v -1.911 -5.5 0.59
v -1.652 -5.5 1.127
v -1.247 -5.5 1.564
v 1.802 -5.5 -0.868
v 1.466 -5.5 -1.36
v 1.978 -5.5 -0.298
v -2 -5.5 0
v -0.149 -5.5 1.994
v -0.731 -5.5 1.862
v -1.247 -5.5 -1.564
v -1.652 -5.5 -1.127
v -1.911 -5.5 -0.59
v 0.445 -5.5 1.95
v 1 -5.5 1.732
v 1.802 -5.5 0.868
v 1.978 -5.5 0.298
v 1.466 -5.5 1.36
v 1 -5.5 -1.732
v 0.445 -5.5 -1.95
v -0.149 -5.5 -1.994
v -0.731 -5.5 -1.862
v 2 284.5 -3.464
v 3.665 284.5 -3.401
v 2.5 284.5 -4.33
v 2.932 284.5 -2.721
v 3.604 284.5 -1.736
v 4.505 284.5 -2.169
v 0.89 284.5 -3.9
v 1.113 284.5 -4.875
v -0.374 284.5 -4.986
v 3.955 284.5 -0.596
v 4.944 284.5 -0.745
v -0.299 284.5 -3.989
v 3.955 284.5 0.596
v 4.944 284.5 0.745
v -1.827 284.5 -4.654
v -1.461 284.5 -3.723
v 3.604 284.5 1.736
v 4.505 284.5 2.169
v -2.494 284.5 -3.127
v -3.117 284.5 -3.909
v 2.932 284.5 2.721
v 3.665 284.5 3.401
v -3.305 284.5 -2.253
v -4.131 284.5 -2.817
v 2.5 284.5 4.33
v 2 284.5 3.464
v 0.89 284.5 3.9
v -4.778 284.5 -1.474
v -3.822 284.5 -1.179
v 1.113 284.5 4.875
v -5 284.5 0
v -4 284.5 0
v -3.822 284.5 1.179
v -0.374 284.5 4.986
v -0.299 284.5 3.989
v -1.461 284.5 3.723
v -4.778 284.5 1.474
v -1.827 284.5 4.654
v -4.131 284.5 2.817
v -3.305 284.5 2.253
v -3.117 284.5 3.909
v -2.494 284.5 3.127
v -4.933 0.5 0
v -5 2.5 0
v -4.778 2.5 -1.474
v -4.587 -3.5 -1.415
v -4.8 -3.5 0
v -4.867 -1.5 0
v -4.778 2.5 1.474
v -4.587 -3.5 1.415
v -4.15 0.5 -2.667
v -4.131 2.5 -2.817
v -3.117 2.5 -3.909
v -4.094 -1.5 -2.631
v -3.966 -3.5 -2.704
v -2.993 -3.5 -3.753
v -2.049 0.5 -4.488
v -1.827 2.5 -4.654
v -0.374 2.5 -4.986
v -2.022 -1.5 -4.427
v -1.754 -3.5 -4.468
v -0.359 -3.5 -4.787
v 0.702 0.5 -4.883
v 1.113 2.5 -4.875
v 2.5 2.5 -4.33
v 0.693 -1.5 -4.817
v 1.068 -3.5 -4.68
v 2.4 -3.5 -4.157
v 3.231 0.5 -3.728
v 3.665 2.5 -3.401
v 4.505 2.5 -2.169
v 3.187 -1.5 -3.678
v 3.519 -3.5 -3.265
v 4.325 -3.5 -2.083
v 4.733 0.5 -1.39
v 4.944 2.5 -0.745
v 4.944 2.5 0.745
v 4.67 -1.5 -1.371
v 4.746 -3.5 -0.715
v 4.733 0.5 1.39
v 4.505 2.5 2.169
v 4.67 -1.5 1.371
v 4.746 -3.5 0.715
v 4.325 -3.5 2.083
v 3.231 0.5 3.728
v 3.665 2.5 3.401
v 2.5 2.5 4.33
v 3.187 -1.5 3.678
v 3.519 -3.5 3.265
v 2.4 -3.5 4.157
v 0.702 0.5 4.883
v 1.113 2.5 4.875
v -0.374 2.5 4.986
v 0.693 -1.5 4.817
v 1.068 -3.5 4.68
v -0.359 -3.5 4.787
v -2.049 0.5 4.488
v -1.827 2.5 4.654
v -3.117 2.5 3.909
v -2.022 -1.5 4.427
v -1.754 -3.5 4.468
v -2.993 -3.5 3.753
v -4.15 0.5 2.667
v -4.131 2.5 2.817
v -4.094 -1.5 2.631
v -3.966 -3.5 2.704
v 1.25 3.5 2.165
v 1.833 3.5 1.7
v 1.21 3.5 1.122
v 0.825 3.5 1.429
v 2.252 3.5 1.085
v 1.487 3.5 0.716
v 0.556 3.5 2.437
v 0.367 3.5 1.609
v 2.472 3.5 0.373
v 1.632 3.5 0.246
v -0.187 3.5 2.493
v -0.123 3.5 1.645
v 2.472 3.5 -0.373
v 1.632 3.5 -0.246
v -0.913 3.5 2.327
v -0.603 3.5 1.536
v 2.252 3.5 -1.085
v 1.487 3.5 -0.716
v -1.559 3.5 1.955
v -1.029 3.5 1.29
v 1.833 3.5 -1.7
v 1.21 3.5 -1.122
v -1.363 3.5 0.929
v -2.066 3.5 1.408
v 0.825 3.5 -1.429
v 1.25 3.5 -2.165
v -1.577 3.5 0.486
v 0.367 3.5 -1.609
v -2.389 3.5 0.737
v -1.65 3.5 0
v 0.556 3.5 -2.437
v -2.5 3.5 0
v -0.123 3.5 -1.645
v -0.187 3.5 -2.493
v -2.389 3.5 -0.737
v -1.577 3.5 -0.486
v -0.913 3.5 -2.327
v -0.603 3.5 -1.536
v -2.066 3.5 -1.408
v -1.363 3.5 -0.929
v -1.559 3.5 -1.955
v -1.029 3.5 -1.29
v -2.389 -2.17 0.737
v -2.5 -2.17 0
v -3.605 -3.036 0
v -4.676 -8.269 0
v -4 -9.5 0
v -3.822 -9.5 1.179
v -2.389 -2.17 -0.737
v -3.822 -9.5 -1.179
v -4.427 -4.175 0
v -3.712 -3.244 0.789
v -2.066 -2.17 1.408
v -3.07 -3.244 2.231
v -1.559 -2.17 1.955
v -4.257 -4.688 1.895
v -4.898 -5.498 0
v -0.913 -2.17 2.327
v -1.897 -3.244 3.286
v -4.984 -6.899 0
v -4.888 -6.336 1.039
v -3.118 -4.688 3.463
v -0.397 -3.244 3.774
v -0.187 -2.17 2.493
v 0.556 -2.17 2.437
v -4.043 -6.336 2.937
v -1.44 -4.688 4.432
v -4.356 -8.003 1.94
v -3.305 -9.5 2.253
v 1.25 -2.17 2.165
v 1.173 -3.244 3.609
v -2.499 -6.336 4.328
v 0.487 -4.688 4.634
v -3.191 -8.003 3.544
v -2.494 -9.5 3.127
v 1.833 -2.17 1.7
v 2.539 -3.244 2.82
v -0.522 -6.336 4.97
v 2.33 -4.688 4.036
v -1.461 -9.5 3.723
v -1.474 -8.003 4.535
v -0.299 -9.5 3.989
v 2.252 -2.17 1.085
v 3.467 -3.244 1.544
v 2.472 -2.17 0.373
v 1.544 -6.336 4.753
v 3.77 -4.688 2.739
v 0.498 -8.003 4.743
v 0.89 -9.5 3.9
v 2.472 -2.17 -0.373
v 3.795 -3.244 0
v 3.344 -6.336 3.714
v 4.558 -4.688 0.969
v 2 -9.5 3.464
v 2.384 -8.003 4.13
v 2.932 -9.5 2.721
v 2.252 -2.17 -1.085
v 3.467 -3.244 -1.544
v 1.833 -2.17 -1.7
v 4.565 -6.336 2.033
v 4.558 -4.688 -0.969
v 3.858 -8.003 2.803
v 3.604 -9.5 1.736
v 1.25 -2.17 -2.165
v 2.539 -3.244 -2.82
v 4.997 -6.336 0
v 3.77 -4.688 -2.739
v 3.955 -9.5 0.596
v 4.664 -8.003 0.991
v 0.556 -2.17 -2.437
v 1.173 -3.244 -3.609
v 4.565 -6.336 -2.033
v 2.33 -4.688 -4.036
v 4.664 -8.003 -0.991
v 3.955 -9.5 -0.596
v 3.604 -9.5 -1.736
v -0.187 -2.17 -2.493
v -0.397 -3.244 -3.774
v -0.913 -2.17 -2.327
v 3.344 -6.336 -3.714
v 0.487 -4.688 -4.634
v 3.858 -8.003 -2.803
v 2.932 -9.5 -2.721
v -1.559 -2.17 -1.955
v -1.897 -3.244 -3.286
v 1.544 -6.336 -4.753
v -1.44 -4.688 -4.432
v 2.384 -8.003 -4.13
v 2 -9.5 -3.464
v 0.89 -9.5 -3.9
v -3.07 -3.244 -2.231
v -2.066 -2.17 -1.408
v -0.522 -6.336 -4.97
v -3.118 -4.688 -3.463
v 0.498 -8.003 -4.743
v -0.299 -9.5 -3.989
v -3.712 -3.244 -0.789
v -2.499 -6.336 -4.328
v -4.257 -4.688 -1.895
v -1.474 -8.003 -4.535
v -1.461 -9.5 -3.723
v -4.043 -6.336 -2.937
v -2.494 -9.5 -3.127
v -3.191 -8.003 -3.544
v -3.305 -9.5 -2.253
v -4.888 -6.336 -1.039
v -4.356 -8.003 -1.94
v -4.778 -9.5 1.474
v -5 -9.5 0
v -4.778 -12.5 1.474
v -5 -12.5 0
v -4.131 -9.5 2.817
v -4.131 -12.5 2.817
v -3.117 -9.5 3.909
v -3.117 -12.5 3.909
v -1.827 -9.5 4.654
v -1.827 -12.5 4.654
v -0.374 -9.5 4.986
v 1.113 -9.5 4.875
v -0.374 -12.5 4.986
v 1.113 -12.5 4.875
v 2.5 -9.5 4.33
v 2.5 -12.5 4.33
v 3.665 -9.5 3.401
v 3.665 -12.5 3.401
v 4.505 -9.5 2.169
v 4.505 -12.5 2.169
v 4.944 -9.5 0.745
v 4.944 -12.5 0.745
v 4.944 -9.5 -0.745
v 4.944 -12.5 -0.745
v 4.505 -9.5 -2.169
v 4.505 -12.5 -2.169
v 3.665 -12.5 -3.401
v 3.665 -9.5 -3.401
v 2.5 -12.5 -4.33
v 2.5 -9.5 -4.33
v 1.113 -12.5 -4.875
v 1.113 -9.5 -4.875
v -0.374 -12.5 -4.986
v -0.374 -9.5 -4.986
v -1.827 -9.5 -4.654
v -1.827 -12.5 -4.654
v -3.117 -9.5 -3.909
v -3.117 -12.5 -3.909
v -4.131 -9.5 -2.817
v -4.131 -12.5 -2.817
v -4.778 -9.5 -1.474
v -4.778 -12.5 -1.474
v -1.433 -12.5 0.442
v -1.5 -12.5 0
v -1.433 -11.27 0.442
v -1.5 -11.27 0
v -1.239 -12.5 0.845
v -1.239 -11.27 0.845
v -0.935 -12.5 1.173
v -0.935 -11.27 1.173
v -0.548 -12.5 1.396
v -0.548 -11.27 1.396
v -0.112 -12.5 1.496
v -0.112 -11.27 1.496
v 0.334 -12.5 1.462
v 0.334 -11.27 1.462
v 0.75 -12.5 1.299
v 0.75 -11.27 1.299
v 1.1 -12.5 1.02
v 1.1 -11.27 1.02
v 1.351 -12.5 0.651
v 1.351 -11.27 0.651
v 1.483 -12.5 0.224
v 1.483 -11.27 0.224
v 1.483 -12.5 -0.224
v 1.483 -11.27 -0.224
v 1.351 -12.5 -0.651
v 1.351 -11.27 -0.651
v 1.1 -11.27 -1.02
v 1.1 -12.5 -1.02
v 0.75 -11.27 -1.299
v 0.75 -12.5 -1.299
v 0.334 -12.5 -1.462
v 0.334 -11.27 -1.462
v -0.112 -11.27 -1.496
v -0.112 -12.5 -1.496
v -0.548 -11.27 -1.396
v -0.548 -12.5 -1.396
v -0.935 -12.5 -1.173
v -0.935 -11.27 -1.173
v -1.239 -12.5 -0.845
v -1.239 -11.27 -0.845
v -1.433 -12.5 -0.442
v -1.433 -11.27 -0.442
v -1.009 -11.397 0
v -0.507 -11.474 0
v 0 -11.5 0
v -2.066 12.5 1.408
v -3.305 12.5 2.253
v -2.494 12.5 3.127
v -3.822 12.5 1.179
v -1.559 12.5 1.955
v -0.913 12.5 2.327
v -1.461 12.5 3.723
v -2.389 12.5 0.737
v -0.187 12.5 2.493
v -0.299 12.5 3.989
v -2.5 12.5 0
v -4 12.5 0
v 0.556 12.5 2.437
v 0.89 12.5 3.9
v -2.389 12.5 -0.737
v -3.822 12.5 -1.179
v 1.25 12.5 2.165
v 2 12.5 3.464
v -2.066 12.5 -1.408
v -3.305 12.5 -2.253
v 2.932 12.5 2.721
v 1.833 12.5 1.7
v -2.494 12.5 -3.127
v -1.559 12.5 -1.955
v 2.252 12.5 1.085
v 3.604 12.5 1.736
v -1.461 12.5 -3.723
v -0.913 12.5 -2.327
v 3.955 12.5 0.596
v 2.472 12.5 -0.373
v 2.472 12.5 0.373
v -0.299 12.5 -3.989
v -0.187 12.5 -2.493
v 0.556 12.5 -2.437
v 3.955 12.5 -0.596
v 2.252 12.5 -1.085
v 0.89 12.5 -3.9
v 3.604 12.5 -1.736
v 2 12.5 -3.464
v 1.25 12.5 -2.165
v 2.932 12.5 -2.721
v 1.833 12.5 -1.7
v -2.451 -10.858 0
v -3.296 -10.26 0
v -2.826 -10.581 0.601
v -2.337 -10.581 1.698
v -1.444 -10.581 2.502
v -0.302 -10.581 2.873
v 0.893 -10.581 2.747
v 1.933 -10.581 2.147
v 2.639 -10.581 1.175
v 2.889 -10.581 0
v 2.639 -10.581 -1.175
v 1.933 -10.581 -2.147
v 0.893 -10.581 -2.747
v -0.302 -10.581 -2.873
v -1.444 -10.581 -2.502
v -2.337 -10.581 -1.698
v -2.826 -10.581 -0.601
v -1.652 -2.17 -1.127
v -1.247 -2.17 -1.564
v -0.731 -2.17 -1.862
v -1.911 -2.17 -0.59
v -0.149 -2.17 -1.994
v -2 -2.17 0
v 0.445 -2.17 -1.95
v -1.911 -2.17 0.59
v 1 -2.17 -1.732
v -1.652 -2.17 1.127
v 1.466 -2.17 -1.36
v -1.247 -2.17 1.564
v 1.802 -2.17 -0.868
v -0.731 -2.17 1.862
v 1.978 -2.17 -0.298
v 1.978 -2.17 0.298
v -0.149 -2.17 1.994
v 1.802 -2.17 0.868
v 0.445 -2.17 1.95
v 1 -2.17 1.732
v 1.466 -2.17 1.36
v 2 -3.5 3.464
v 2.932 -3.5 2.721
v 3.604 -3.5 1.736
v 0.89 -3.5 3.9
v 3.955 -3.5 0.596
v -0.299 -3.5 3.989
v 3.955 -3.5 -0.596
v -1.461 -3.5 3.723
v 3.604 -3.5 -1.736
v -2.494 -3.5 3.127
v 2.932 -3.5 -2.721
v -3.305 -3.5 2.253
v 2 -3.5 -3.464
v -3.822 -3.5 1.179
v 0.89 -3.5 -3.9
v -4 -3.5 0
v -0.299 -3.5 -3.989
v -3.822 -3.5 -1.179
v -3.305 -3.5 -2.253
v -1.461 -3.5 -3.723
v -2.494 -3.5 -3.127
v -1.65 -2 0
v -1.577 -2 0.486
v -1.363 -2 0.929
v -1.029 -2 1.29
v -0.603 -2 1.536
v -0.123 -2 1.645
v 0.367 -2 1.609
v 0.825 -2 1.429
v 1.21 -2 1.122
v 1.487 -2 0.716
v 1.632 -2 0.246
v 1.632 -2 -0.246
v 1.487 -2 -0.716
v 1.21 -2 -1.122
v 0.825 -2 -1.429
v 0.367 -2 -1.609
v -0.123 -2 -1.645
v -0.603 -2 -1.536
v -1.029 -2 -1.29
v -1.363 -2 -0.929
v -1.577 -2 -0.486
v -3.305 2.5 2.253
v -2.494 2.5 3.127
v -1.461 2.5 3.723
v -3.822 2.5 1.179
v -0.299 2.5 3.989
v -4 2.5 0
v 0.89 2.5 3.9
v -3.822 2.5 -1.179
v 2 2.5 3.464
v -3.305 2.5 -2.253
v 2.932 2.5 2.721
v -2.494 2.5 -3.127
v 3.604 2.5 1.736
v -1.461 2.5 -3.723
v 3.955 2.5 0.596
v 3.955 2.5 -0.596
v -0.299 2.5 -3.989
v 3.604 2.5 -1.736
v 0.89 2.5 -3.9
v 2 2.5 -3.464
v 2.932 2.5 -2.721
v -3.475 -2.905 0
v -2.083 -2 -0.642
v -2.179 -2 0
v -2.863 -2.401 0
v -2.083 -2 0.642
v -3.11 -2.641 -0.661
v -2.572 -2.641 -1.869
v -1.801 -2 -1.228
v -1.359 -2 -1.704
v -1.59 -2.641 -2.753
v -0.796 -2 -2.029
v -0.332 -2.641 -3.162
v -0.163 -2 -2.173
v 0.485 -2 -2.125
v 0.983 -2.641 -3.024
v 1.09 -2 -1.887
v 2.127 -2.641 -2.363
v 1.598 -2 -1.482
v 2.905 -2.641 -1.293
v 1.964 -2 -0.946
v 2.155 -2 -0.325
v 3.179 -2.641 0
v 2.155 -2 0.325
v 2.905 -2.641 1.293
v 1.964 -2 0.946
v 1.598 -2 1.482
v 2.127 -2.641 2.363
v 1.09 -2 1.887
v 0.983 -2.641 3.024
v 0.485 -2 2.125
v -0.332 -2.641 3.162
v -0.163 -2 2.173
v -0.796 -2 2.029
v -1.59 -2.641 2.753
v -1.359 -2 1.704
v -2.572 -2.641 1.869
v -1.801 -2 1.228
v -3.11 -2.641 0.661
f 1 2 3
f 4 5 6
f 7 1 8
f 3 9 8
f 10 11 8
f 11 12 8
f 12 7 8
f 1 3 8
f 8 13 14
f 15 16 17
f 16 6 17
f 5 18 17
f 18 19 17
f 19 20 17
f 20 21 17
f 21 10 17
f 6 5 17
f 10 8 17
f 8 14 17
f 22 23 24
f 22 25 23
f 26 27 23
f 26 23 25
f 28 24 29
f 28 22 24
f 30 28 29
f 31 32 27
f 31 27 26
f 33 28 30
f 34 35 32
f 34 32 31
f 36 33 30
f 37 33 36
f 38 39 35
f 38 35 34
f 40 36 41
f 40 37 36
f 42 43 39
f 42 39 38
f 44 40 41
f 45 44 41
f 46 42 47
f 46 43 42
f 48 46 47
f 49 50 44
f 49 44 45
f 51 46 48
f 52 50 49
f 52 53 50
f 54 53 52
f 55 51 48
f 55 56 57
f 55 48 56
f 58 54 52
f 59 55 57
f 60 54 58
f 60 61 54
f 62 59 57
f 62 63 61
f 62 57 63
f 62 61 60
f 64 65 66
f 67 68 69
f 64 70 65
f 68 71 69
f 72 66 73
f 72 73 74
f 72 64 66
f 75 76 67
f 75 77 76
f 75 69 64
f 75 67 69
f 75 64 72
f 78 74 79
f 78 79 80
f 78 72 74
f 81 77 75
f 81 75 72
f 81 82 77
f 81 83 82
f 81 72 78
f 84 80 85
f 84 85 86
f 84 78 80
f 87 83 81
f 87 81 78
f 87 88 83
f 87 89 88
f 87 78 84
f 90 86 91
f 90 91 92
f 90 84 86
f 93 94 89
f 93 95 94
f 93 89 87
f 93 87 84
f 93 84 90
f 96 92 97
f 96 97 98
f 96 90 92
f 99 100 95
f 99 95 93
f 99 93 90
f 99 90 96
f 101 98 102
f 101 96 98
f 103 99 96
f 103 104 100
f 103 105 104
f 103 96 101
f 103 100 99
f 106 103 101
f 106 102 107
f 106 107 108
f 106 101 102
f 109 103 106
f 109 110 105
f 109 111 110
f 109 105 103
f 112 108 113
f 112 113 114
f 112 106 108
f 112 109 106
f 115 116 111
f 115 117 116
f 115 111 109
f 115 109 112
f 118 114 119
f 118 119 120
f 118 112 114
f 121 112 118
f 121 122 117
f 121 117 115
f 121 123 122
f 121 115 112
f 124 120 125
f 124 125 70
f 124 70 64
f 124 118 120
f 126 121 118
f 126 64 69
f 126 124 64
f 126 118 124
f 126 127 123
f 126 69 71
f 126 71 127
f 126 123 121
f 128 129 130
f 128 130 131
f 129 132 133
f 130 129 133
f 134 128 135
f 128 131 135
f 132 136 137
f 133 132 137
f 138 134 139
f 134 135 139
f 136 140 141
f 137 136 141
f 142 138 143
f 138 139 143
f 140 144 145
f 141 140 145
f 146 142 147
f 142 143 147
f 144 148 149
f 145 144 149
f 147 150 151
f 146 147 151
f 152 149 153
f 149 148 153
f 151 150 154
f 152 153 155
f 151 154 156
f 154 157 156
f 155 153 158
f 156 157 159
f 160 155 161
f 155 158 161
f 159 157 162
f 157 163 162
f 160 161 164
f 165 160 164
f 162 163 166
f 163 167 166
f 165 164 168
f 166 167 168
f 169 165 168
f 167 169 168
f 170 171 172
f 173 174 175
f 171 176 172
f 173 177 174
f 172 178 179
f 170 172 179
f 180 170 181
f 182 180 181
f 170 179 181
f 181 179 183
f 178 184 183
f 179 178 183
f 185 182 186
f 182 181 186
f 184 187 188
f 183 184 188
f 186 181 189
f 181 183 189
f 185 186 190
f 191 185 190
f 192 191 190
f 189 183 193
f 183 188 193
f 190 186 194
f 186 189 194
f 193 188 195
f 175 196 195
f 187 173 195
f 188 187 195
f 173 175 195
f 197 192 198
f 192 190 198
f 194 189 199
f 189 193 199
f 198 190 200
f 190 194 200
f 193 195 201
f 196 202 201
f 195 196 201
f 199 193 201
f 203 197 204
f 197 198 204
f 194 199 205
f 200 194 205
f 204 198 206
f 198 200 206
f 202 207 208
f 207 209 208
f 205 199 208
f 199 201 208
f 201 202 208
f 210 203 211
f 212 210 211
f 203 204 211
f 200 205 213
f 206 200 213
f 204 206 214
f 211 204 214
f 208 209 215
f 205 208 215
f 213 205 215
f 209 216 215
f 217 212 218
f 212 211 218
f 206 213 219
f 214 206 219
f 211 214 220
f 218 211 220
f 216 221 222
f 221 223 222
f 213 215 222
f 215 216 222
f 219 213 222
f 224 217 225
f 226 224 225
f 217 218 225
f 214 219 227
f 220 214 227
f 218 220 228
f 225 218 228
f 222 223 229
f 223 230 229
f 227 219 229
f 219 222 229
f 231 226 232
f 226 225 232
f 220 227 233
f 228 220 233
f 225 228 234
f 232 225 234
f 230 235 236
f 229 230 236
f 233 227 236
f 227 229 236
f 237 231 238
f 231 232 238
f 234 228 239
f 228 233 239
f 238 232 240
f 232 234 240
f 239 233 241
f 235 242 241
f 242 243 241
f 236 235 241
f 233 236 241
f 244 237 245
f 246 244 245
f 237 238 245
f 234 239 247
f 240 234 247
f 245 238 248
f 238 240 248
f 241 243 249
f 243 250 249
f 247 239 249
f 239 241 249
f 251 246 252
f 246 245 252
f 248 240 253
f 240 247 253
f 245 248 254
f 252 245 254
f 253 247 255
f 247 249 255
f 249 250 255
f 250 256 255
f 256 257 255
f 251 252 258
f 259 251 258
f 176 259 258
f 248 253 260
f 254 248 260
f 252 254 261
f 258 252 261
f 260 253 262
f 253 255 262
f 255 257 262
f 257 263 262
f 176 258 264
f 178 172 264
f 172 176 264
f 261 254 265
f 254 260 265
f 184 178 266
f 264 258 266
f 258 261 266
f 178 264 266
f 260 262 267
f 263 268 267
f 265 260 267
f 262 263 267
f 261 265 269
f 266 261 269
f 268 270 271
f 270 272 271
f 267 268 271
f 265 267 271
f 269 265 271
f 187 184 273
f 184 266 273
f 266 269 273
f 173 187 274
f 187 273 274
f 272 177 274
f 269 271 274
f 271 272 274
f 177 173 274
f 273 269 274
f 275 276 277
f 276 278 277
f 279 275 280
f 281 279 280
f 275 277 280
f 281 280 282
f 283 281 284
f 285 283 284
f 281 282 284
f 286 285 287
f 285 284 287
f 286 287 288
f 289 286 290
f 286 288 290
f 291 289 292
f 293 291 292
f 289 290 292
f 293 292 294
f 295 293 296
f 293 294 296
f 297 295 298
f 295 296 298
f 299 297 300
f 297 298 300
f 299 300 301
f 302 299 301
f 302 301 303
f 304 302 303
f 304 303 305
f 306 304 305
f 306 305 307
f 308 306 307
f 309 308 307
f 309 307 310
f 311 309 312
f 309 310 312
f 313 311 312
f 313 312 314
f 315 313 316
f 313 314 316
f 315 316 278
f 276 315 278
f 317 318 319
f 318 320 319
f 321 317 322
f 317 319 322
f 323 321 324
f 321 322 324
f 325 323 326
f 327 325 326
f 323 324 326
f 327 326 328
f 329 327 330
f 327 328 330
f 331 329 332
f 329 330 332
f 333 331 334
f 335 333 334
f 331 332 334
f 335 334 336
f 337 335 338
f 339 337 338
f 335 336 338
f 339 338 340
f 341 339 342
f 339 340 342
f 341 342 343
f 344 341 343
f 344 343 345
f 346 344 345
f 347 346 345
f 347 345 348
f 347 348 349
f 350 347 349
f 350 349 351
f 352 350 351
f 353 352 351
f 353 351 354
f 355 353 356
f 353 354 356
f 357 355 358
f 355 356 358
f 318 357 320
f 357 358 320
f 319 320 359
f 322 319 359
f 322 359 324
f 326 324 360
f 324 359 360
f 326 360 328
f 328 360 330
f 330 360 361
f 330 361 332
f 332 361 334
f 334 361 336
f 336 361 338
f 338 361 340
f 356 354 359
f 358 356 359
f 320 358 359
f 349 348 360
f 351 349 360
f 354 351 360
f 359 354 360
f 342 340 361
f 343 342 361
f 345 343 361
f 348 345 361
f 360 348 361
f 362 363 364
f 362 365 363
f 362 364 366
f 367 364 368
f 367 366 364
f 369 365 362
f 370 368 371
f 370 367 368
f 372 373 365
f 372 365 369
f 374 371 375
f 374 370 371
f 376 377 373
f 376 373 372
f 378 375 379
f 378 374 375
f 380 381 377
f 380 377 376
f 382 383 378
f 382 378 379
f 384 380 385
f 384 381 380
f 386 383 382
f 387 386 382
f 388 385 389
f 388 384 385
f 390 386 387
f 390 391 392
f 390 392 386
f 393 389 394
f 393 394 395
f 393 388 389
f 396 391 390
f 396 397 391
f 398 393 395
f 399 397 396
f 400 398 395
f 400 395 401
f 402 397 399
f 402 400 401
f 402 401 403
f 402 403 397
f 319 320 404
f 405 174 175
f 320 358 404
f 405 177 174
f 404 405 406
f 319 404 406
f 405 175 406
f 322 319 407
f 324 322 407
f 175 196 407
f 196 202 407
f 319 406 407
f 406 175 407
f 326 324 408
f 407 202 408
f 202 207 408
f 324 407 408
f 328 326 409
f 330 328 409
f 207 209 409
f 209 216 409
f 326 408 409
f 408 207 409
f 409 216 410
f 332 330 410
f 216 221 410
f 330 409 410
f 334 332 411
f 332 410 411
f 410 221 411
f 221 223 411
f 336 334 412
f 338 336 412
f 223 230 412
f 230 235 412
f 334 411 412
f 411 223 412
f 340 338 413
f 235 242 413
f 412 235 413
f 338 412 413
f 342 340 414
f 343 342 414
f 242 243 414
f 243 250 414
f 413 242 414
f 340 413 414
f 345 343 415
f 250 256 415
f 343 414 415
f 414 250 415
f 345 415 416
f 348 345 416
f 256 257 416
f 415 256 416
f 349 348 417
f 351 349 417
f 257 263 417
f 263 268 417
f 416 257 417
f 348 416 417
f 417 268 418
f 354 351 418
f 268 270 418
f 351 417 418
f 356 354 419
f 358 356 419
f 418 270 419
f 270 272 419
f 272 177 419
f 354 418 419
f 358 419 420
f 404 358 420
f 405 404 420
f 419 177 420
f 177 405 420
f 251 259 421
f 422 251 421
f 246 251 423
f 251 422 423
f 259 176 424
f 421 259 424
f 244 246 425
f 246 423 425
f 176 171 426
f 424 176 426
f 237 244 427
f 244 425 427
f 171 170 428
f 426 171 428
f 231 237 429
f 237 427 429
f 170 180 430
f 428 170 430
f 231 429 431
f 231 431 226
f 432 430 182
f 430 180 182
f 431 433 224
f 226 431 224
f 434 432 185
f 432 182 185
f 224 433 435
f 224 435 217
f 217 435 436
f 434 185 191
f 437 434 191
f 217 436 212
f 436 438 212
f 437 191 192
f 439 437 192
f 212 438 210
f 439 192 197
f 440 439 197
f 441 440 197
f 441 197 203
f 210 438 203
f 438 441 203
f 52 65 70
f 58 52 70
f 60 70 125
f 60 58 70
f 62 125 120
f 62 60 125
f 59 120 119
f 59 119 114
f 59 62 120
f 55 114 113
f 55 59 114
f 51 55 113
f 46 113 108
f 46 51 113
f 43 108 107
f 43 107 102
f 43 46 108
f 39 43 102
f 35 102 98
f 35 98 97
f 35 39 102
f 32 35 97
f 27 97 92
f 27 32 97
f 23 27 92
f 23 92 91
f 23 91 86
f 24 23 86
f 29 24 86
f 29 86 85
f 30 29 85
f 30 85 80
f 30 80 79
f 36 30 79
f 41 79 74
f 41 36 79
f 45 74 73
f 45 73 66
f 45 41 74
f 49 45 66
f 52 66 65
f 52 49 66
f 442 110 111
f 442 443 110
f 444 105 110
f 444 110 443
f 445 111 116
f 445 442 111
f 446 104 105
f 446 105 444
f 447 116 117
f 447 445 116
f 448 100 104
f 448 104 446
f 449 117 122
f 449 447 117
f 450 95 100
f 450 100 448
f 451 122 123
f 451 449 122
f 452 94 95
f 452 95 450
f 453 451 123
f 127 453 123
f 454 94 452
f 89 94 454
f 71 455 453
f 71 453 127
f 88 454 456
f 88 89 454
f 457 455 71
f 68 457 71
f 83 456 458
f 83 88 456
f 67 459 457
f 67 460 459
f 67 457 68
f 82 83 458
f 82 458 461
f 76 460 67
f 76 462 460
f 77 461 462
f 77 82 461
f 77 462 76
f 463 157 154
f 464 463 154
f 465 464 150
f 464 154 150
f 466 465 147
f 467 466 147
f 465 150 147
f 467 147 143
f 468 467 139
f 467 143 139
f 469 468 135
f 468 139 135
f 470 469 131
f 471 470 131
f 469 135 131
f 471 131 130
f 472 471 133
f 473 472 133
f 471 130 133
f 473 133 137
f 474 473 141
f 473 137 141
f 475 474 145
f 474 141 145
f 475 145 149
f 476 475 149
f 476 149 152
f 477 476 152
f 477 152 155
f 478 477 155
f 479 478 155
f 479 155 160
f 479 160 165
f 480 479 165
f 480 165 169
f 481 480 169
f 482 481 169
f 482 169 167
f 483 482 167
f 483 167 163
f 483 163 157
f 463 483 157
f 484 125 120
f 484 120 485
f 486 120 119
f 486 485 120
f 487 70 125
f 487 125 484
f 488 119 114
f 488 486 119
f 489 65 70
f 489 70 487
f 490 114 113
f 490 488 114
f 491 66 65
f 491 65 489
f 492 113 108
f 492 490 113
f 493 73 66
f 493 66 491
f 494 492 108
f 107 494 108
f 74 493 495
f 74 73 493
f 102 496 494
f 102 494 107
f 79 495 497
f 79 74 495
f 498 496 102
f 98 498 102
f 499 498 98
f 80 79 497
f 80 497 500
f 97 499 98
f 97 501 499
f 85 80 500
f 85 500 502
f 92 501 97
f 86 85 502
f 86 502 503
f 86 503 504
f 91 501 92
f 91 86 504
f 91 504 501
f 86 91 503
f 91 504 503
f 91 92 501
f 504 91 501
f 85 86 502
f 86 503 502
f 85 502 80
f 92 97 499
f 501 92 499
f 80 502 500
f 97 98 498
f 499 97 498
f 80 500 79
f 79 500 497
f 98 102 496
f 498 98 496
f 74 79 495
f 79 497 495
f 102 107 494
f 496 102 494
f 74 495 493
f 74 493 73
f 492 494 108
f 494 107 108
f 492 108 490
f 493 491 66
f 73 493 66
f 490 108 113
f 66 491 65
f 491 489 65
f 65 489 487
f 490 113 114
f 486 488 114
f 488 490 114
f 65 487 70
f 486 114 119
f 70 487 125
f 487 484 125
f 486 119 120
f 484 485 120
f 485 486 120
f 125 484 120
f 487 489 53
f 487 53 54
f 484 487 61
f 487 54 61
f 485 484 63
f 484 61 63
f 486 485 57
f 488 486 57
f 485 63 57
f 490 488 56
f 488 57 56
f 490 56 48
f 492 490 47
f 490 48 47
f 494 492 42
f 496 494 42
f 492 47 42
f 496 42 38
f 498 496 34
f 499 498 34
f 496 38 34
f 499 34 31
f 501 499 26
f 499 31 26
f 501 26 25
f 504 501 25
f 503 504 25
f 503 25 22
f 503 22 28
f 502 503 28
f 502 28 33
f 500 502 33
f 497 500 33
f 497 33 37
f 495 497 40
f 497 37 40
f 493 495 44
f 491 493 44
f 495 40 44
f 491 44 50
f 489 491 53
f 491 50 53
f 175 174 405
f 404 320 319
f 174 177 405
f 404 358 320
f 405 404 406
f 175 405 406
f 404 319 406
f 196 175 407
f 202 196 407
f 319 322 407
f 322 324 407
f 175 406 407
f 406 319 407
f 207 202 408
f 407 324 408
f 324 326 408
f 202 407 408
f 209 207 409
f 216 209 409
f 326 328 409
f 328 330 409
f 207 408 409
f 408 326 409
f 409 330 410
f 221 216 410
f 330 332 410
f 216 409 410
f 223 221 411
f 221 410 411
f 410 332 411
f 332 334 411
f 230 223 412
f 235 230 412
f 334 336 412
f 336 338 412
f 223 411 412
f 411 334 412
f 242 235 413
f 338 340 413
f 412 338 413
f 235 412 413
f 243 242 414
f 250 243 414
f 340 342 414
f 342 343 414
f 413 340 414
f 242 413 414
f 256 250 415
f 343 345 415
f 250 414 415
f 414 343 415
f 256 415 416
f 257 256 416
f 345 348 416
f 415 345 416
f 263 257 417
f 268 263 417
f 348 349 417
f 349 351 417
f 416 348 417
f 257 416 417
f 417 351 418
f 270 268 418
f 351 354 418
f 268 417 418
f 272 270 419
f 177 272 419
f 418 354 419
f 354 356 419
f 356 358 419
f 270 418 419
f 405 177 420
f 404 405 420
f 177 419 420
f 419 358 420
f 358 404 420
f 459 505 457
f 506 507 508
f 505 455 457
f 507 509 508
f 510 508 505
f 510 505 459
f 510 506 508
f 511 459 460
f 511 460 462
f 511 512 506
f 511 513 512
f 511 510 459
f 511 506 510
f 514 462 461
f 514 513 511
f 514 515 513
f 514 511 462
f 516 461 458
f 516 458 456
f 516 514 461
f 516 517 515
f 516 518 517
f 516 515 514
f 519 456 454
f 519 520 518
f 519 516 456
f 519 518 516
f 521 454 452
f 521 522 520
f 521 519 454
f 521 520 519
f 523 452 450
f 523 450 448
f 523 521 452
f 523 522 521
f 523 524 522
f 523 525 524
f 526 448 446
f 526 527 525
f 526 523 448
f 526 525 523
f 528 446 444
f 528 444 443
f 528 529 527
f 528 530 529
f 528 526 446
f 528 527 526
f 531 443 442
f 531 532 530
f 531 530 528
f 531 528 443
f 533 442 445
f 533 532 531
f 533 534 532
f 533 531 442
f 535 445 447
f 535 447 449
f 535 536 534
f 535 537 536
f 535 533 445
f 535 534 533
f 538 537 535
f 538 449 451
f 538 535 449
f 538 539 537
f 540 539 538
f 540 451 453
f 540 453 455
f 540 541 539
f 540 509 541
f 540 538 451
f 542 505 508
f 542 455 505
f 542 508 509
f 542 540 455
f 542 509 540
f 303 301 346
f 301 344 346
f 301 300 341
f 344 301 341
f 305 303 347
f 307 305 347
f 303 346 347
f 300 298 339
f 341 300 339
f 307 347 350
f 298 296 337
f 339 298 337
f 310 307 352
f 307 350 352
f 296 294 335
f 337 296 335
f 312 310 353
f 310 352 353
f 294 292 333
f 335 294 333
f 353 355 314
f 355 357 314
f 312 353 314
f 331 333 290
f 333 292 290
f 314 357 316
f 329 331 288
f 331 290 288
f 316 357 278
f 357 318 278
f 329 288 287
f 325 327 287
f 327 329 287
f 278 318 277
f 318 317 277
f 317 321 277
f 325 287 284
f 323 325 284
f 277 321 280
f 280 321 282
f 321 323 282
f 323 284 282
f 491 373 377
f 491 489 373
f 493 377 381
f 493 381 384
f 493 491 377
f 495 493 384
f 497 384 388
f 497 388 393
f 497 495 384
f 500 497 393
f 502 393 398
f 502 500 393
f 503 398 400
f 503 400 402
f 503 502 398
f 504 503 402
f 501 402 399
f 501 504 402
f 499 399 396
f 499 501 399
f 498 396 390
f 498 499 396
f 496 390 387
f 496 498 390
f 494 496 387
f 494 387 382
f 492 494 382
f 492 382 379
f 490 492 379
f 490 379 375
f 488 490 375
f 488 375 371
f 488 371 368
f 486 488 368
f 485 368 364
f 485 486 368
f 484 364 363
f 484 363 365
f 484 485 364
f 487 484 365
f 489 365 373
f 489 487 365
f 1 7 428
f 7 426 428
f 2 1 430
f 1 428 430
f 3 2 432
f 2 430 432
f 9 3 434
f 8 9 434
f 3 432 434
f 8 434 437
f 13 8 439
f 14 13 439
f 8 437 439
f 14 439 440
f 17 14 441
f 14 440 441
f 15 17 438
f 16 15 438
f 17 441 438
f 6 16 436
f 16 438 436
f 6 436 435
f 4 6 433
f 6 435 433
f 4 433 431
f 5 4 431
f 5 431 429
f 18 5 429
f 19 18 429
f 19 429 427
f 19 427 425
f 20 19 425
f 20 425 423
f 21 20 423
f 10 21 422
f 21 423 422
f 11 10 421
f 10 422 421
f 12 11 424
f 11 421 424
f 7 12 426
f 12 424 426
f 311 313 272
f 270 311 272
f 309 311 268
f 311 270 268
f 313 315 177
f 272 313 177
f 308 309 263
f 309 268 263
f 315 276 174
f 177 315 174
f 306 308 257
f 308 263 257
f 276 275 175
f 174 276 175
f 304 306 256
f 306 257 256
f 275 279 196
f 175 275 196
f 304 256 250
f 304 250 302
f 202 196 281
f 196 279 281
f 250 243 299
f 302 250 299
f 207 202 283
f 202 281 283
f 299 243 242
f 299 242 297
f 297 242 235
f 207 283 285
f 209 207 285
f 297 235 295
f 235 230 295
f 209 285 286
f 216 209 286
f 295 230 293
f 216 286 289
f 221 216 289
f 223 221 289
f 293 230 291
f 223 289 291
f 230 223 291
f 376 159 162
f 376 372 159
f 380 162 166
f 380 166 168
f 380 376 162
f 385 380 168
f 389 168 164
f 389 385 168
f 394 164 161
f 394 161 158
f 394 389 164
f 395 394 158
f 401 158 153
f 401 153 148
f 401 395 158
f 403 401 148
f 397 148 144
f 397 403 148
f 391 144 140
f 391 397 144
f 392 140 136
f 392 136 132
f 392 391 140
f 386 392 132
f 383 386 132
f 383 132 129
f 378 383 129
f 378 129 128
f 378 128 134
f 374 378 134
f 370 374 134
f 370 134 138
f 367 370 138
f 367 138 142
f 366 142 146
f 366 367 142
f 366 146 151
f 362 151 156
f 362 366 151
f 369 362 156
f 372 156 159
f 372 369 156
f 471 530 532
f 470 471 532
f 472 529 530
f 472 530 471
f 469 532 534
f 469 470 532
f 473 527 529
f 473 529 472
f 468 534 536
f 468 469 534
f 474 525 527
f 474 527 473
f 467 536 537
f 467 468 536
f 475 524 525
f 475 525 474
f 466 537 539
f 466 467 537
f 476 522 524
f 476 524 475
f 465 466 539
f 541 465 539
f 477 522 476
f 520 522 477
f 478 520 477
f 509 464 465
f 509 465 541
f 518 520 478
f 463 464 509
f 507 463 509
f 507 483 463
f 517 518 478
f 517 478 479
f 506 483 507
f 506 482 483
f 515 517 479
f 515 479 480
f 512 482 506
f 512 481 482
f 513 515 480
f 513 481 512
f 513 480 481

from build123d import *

# Parameters (mm, degrees)
F1_W     = 1
F1_H     = 282
F5_W     = 2.5
F5_H     = 4
F8_D     = 3.3
F8_DEPTH = 8.6
F8_TIP   = 0.9914200214


with BuildPart() as f2:
    # F1 (on Top) → F2 (revolve)
    with BuildSketch(Plane.XY):
        with Locations((-4.5, 143.5)):
            Rectangle(F1_W, F1_H)
    revolve(axis=Axis((0, -9, 0), (0, 1, 0)))


with BuildPart() as f3:
    # F0 (on Top) → F3 (revolve)
    with BuildSketch(Plane.XY):
        with BuildLine():
            Line((-1.5, -12.5), (-1.5, -11.2696960071))
            ThreePointArc((-1.5, -11.2696960071), (-2.8888502885, -10.5809979185), (-4, -9.5))
            Line((-4, -9.5), (-5, -9.5))
            Line((-5, -9.5), (-5, -12.5))
            Line((-5, -12.5), (-1.5, -12.5))
        make_face()
    revolve(axis=Axis((0, -9, 0), (0, 1, 0)))


with BuildPart() as f4:
    # F0 (on Top) → F4 (revolve)
    with BuildSketch(Plane.XY):
        with BuildLine():
            ThreePointArc((-1.5, -11.2696960071), (-0.7587884964, -11.4420886291), (0, -11.5))
            Line((0, -11.5), (0, -6.5))
            Line((0, -6.5), (0, -5.5))
            Line((0, -5.5), (-2, -5.5))
            Line((-2, -5.5), (-2, -2.1698729811))
            Line((-2, -2.1698729811), (-2.5, -2.1698729811))
            ThreePointArc((-2.5, -2.1698729811), (-4.8984885963, -5.4975981486), (-4, -9.5))
            ThreePointArc((-4, -9.5), (-2.8888502885, -10.5809979185), (-1.5, -11.2696960071))
        make_face()
    revolve(axis=Axis((0, -6, 0), (0, 1, 0)))


with BuildPart() as f6:
    # F5 (on Top) → F6 (revolve)
    with BuildSketch(Plane.XY):
        with BuildLine():
            Line((-4.8, -3.5), (-4, -3.5))
            ThreePointArc((-4, -3.5), (-3.1794494718, -2.6411010565), (-2.1794494718, -2))
            Line((-2.1794494718, -2), (0, -2))
            Line((0, -2), (0, -0.5))
            Line((0, -0.5), (-2.5, -0.5))
            Line((-2.5, -0.5), (-2.5, 3.5))
            Line((-2.5, 3.5), (-2.5, 12.5))
            Line((-2.5, 12.5), (-4, 12.5))
            Line((-4, 12.5), (-4, 2.5))
            Line((-4, 2.5), (-5, 2.5))
            Line((-5, 2.5), (-4.8, -3.5))
        make_face()
        with Locations((-1.25, 1.5)):
            Rectangle(F5_W, F5_H)
    revolve(axis=Axis((0, -1.25, 0), (0, -1, 0)))

    # F8
    with Locations(Plane.XZ.offset(2)):
        with Locations((0, 0)):
            Hole(F8_D / 2, depth=F8_DEPTH)
            with Locations((0, 0, -(F8_DEPTH + F8_TIP / 2))):  # 118° drill point
                Cone(0, F8_D / 2, F8_TIP, mode=Mode.SUBTRACT)


solid = Compound([f2.part, f3.part, f4.part, f6.part])
